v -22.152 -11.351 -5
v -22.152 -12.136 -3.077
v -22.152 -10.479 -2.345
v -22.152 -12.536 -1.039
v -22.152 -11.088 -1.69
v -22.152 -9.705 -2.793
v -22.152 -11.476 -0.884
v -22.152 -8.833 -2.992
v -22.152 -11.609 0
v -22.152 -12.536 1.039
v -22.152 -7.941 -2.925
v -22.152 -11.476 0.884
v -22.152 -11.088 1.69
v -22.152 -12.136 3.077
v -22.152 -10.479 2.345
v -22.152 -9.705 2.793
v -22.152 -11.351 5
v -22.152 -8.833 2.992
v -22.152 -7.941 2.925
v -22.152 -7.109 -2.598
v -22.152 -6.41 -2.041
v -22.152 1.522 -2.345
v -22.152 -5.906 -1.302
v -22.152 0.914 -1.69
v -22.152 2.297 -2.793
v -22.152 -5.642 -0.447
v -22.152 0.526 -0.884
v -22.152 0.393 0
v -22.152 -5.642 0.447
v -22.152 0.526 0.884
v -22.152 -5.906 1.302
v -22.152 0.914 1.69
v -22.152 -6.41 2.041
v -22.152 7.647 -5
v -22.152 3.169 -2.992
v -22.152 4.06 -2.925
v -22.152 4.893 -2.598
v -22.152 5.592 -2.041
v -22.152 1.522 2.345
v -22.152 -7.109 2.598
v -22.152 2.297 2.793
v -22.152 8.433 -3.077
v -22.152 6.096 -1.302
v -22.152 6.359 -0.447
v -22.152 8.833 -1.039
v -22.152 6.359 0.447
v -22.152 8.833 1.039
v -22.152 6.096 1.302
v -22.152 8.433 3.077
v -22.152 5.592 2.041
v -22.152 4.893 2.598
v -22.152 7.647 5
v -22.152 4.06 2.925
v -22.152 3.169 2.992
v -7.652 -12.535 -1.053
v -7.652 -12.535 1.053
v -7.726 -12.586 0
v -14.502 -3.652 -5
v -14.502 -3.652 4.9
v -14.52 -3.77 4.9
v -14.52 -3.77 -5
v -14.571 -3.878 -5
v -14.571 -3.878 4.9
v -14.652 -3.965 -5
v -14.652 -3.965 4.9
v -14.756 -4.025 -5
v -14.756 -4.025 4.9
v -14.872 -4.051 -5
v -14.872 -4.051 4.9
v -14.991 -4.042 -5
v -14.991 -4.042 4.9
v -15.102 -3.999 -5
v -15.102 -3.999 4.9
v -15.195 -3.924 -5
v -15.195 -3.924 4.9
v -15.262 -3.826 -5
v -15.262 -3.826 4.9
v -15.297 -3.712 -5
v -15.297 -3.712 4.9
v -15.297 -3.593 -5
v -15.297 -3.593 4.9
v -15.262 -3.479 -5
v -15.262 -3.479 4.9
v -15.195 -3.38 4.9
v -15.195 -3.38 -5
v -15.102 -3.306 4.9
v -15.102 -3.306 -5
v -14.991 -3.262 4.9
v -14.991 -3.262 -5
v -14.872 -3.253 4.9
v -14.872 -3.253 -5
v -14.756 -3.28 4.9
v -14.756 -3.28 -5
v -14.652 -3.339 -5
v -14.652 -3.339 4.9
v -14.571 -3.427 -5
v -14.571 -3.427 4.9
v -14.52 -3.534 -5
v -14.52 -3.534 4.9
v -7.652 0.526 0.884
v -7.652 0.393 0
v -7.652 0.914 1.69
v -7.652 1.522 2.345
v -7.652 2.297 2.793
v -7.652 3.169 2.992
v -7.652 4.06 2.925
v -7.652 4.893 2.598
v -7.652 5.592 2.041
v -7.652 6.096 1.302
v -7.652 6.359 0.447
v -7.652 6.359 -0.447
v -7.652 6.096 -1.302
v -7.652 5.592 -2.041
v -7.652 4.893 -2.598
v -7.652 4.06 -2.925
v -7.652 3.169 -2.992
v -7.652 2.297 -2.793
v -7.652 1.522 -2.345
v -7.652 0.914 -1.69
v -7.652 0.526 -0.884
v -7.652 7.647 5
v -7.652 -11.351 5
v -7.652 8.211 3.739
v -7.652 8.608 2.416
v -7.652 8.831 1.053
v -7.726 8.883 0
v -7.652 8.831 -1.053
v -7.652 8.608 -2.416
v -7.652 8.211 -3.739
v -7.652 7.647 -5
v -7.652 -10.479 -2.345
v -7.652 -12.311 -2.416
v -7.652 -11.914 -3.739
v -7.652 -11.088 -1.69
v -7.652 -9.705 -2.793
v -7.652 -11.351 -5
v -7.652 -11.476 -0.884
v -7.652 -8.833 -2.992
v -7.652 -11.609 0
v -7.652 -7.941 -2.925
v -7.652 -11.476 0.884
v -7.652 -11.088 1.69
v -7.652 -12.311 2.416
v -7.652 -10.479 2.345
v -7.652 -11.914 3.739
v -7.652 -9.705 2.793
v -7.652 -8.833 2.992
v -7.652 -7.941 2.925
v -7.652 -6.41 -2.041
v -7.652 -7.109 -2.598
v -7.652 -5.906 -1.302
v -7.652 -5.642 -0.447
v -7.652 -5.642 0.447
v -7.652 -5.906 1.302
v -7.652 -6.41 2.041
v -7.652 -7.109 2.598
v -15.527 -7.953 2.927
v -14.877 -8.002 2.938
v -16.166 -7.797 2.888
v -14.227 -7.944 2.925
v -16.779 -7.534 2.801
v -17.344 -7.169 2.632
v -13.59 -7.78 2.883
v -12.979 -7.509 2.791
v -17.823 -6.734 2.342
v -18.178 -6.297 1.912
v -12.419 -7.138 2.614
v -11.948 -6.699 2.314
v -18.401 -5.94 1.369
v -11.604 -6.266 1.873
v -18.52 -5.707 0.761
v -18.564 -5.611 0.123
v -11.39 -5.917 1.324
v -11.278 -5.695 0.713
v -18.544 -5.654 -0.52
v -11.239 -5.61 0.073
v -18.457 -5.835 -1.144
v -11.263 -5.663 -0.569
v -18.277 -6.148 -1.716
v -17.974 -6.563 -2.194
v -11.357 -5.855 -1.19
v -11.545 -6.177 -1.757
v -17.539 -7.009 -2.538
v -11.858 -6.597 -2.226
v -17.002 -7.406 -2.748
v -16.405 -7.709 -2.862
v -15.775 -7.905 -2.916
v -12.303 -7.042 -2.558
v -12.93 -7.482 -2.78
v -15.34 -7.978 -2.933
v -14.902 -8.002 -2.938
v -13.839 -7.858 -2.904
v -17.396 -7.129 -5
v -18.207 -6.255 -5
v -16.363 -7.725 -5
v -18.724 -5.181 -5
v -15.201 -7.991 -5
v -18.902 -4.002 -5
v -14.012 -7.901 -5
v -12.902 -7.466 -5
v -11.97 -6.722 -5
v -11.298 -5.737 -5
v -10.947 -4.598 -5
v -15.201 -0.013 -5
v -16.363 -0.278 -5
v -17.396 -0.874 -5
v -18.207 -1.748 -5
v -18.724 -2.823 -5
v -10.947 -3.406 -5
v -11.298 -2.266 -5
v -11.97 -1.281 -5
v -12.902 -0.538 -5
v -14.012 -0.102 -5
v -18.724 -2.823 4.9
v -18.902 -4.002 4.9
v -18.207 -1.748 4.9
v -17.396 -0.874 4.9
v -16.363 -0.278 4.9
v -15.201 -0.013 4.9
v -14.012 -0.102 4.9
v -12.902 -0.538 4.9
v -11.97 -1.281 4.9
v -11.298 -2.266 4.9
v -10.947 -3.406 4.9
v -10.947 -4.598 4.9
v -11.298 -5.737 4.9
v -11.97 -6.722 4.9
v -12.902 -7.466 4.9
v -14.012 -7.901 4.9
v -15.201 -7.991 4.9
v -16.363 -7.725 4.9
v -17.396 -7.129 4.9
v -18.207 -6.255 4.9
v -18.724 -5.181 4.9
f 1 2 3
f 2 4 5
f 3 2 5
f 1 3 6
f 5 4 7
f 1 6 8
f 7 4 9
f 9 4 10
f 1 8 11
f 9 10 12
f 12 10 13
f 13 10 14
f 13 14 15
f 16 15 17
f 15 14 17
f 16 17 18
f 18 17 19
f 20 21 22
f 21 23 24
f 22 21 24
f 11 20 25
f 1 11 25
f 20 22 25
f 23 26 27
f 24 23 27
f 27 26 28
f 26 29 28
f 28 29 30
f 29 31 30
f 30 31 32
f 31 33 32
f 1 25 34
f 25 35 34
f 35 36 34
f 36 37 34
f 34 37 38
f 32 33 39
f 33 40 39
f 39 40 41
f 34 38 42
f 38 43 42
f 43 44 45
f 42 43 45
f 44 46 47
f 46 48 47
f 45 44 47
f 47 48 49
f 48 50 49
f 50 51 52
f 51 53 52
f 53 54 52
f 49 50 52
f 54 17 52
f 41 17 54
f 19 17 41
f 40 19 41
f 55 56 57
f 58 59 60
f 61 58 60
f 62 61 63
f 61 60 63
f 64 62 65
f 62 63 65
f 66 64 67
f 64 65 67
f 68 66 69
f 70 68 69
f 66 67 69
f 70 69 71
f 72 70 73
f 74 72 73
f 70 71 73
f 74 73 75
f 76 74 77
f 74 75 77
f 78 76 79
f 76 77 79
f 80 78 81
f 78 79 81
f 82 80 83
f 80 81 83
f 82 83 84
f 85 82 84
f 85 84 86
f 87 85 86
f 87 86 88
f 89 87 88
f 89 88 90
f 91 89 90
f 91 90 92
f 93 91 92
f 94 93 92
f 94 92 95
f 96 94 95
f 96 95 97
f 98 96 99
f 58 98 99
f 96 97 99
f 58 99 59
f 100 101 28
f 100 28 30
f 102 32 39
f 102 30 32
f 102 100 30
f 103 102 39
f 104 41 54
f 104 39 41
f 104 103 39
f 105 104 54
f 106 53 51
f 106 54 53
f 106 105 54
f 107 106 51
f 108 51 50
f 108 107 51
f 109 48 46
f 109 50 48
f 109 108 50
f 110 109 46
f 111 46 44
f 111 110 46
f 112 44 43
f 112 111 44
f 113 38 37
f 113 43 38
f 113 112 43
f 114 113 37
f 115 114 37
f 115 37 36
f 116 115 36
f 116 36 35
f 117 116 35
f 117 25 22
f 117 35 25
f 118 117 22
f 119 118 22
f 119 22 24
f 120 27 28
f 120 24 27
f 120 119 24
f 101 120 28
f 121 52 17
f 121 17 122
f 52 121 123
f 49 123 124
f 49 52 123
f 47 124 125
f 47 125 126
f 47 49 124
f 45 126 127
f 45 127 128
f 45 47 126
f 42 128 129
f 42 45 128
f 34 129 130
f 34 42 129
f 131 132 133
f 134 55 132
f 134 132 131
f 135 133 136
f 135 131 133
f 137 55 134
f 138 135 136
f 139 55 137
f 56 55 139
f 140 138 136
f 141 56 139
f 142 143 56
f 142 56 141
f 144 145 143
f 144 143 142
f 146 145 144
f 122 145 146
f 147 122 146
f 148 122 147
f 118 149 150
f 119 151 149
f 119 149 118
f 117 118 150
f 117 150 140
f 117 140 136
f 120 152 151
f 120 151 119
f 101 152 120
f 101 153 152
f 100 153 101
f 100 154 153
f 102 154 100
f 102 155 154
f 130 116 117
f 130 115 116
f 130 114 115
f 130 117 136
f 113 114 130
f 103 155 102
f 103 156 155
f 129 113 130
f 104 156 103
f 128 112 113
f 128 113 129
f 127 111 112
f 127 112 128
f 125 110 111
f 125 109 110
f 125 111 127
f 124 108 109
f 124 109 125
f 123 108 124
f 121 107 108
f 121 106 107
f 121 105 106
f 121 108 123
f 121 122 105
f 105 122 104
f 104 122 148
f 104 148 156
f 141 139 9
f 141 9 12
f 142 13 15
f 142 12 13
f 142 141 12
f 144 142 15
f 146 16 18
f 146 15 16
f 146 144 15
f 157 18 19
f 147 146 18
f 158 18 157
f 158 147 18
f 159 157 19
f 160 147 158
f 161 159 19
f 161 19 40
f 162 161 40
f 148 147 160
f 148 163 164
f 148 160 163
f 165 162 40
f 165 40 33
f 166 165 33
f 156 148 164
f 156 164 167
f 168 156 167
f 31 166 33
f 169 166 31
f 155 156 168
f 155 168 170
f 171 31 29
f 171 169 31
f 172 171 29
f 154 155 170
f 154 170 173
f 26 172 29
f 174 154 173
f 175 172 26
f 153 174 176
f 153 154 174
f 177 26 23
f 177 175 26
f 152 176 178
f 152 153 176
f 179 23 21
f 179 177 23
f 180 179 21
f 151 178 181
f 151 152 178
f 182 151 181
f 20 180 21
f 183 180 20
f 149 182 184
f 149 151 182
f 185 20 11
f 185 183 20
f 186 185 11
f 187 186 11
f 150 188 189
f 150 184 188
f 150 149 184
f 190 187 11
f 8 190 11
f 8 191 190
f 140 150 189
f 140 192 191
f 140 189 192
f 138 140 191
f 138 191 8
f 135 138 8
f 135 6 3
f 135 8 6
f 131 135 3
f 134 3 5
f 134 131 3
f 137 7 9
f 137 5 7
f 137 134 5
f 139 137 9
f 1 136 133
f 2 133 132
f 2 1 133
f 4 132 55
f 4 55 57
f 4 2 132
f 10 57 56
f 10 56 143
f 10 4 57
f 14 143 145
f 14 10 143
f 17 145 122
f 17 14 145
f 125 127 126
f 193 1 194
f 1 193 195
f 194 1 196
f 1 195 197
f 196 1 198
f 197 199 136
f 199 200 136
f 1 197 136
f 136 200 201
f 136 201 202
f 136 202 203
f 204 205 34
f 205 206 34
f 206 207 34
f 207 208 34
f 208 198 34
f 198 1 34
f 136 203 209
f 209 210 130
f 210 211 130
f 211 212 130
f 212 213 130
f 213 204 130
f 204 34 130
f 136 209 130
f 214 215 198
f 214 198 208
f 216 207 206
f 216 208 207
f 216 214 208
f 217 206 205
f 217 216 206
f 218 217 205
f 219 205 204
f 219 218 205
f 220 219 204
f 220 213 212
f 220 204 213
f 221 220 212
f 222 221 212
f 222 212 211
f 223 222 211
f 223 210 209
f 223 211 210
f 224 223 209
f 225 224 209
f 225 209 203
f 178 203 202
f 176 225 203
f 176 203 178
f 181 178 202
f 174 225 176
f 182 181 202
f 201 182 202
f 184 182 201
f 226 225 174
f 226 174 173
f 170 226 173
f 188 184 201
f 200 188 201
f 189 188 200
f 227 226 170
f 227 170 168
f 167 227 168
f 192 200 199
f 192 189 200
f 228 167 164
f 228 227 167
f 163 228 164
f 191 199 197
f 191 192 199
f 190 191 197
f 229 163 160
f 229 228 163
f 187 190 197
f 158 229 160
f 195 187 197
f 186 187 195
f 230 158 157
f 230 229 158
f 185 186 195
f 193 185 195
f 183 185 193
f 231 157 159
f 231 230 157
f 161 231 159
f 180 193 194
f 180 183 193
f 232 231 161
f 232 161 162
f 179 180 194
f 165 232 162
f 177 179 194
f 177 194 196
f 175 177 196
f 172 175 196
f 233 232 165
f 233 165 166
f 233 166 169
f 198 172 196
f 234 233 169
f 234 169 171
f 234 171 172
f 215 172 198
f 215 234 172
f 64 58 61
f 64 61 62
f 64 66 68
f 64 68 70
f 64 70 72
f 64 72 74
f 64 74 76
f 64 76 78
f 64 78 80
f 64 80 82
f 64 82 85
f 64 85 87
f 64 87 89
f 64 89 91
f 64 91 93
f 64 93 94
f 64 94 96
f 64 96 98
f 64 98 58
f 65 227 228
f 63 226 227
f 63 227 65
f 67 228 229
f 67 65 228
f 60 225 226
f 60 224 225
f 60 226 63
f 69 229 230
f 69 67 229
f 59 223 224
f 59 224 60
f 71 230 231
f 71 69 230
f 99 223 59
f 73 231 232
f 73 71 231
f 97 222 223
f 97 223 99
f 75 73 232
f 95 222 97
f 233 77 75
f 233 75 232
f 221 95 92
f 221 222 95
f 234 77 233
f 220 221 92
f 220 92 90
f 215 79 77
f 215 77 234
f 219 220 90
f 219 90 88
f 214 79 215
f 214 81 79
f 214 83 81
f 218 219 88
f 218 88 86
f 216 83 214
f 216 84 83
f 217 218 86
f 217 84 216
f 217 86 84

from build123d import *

# Parameters (mm, degrees)
SKETCH1_W               = 14.5
SKETCH1_H               = 30
SKETCH1_R               = 3
BOSS_EXTRUDE1_DEPTH     = 5
CUT_EXTRUDE1_DEPTH      = 30.097274604
CUT_EXTRUDE1_DEPTH_BACK = 30.097274604
SKETCH2_R               = 4
CUT_EXTRUDE2_DEPTH      = 23.16293341
CUT_EXTRUDE2_DEPTH_BACK = 23.16293341
SKETCH3_R               = 3
CUT_EXTRUDE3_DEPTH      = 23.162933498
CUT_EXTRUDE3_DEPTH_BACK = 23.162933498
SKETCH4_R               = 3
BOSS_EXTRUDE5_START     = -10
SKETCH6_R               = 5
BOSS_EXTRUDE5_DEPTH     = 0.1
SKETCH7_R               = 0.4
BOSS_EXTRUDE6_DEPTH     = 9.9
SKETCH8_W               = 10
SKETCH8_H               = 5.416493121
CUT_EXTRUDE5_DEPTH      = 23.162933498
CUT_EXTRUDE6_START      = -10
CUT_EXTRUDE6_DEPTH      = 10
CUT_EXTRUDE7_START      = -14.5
CUT_EXTRUDE7_DEPTH      = 14.5


# Read off the part's stored shape, not the designer's step: Cut-Extrude6, Cut-Extrude7
with BuildPart() as part:
    # Sketch1 → Boss-Extrude1 (new, symmetric)
    with BuildSketch(Plane.XY):
        with Locations((-14.901879651, 0.998300452)):
            Rectangle(SKETCH1_W, SKETCH1_H)
        with Locations((-14.901879651, -4.732232083)):
            Circle(SKETCH1_R, mode=Mode.SUBTRACT)
    extrude(amount=BOSS_EXTRUDE1_DEPTH, both=True)

    # Sketch2 → Cut-Extrude1 (cut, two sides: drawn at the far end of the back side and taken through both)
    with BuildSketch(Plane(origin=(0, 0, -5), x_dir=(-1, 0, 0), z_dir=(0, 0, -1)).offset(-CUT_EXTRUDE1_DEPTH_BACK)):
        with Locations((14.901879651, -4.001699548)):
            Circle(SKETCH2_R)
    extrude(amount=CUT_EXTRUDE1_DEPTH + CUT_EXTRUDE1_DEPTH_BACK, mode=Mode.SUBTRACT)

    # Sketch3 → Cut-Extrude2 (cut, two sides: drawn at the far end of the back side and taken through both)
    with BuildSketch(Plane.ZY.offset(22.151879651).offset(-CUT_EXTRUDE2_DEPTH_BACK)):
        with Locations(Location((0, -8.608931628, 0), (0, 0, 270))):
            Circle(SKETCH3_R)
    extrude(amount=CUT_EXTRUDE2_DEPTH + CUT_EXTRUDE2_DEPTH_BACK, mode=Mode.SUBTRACT)

    # Sketch4 → Cut-Extrude3 (cut, two sides: drawn at the far end of the back side and taken through both)
    with BuildSketch(Plane.ZY.offset(22.151879651).offset(-CUT_EXTRUDE3_DEPTH_BACK)):
        with Locations(Location((0, 3.392776132, 0), (0, 0, 270))):
            Circle(SKETCH4_R)
    extrude(amount=CUT_EXTRUDE3_DEPTH + CUT_EXTRUDE3_DEPTH_BACK, mode=Mode.SUBTRACT)

    # Sketch6 → Boss-Extrude5 (add)
    with BuildSketch(Plane(origin=(0, 0, -5), x_dir=(-1, 0, 0), z_dir=(0, 0, -1)).offset(BOSS_EXTRUDE5_START)):
        with Locations((14.901879651, -4.001699548)):
            Circle(SKETCH6_R)
    extrude(amount=BOSS_EXTRUDE5_DEPTH)

    # Sketch7 → Boss-Extrude6 (add)
    with BuildSketch(Plane(origin=(0, 0, 4.9), x_dir=(-1, 0, 0), z_dir=(0, 0, -1))):
        with Locations(Location((14.901879651, -3.652232083, 0), (0, 0, 180))):
            Circle(SKETCH7_R)
    extrude(amount=BOSS_EXTRUDE6_DEPTH)

    # Sketch8 → Cut-Extrude5 (cut, through all)
    with BuildSketch(Plane(origin=(-7.651879651, 0, 0), x_dir=(0, 0, -1), z_dir=(1, 0, 0))):
        with Locations((0, 13.290053892)):
            Rectangle(SKETCH8_W, SKETCH8_H)
    extrude(amount=-CUT_EXTRUDE5_DEPTH, mode=Mode.SUBTRACT)

    # Cut-Extrude6 outline → Cut-Extrude6 (cut)
    with BuildSketch(Plane(origin=(0, 0, -5), x_dir=(-1, 0, 0), z_dir=(0, 0, -1)).offset(CUT_EXTRUDE6_START)):
        with BuildLine():
            ThreePointArc((7.651879651, 8.831200001), (9.341126693, 9.839033909), (11.162547128, 10.581807331))
            Line((11.162547128, 10.581807331), (7.651879651, 10.581807331))
            Line((7.651879651, 10.581807331), (7.651879651, 8.831200001))
        make_face()
        with BuildLine():
            Line((22.151879651, 10.581807331), (19.178996312, 10.581807331))
            ThreePointArc((19.178996312, 10.581807331), (20.709322329, 9.979718674), (22.151879651, 9.190138504))
            Line((22.151879651, 9.190138504), (22.151879651, 10.581807331))
        make_face()
        with BuildLine():
            ThreePointArc((10.371064905, -14.001699548), (8.967948653, -13.348856833), (7.651879651, -12.534669381))
            Line((7.651879651, -12.534669381), (7.651879651, -14.001699548))
            Line((7.651879651, -14.001699548), (10.371064905, -14.001699548))
        make_face()
        with BuildLine():
            Line((22.151879651, -14.001699548), (22.151879651, -12.893607884))
            ThreePointArc((22.151879651, -12.893607884), (21.087178214, -13.498835864), (19.970478535, -14.001699548))
            Line((19.970478535, -14.001699548), (22.151879651, -14.001699548))
        make_face()
    extrude(amount=CUT_EXTRUDE6_DEPTH, mode=Mode.SUBTRACT)

    # Cut-Extrude7 outline → Cut-Extrude7 (cut)
    with BuildSketch(Plane(origin=(-7.651879651, 0, 0), x_dir=(0, 0, -1), z_dir=(1, 0, 0)).offset(CUT_EXTRUDE7_START)):
        with BuildLine():
            ThreePointArc((5, -11.350842885), (0, -12.5864008), (-5, -11.350842885))
            Line((-5, -11.350842885), (-5, -14.001699548))
            Line((-5, -14.001699548), (5, -14.001699548))
            Line((5, -14.001699548), (5, -11.350842885))
        make_face()
        with BuildLine():
            Line((-5, 10.581807331), (-5, 7.647373505))
            ThreePointArc((-5, 7.647373505), (0, 8.882931421), (5, 7.647373505))
            Line((5, 7.647373505), (5, 10.581807331))
            Line((5, 10.581807331), (-5, 10.581807331))
        make_face()
    extrude(amount=CUT_EXTRUDE7_DEPTH, mode=Mode.SUBTRACT)


solid = part.part
